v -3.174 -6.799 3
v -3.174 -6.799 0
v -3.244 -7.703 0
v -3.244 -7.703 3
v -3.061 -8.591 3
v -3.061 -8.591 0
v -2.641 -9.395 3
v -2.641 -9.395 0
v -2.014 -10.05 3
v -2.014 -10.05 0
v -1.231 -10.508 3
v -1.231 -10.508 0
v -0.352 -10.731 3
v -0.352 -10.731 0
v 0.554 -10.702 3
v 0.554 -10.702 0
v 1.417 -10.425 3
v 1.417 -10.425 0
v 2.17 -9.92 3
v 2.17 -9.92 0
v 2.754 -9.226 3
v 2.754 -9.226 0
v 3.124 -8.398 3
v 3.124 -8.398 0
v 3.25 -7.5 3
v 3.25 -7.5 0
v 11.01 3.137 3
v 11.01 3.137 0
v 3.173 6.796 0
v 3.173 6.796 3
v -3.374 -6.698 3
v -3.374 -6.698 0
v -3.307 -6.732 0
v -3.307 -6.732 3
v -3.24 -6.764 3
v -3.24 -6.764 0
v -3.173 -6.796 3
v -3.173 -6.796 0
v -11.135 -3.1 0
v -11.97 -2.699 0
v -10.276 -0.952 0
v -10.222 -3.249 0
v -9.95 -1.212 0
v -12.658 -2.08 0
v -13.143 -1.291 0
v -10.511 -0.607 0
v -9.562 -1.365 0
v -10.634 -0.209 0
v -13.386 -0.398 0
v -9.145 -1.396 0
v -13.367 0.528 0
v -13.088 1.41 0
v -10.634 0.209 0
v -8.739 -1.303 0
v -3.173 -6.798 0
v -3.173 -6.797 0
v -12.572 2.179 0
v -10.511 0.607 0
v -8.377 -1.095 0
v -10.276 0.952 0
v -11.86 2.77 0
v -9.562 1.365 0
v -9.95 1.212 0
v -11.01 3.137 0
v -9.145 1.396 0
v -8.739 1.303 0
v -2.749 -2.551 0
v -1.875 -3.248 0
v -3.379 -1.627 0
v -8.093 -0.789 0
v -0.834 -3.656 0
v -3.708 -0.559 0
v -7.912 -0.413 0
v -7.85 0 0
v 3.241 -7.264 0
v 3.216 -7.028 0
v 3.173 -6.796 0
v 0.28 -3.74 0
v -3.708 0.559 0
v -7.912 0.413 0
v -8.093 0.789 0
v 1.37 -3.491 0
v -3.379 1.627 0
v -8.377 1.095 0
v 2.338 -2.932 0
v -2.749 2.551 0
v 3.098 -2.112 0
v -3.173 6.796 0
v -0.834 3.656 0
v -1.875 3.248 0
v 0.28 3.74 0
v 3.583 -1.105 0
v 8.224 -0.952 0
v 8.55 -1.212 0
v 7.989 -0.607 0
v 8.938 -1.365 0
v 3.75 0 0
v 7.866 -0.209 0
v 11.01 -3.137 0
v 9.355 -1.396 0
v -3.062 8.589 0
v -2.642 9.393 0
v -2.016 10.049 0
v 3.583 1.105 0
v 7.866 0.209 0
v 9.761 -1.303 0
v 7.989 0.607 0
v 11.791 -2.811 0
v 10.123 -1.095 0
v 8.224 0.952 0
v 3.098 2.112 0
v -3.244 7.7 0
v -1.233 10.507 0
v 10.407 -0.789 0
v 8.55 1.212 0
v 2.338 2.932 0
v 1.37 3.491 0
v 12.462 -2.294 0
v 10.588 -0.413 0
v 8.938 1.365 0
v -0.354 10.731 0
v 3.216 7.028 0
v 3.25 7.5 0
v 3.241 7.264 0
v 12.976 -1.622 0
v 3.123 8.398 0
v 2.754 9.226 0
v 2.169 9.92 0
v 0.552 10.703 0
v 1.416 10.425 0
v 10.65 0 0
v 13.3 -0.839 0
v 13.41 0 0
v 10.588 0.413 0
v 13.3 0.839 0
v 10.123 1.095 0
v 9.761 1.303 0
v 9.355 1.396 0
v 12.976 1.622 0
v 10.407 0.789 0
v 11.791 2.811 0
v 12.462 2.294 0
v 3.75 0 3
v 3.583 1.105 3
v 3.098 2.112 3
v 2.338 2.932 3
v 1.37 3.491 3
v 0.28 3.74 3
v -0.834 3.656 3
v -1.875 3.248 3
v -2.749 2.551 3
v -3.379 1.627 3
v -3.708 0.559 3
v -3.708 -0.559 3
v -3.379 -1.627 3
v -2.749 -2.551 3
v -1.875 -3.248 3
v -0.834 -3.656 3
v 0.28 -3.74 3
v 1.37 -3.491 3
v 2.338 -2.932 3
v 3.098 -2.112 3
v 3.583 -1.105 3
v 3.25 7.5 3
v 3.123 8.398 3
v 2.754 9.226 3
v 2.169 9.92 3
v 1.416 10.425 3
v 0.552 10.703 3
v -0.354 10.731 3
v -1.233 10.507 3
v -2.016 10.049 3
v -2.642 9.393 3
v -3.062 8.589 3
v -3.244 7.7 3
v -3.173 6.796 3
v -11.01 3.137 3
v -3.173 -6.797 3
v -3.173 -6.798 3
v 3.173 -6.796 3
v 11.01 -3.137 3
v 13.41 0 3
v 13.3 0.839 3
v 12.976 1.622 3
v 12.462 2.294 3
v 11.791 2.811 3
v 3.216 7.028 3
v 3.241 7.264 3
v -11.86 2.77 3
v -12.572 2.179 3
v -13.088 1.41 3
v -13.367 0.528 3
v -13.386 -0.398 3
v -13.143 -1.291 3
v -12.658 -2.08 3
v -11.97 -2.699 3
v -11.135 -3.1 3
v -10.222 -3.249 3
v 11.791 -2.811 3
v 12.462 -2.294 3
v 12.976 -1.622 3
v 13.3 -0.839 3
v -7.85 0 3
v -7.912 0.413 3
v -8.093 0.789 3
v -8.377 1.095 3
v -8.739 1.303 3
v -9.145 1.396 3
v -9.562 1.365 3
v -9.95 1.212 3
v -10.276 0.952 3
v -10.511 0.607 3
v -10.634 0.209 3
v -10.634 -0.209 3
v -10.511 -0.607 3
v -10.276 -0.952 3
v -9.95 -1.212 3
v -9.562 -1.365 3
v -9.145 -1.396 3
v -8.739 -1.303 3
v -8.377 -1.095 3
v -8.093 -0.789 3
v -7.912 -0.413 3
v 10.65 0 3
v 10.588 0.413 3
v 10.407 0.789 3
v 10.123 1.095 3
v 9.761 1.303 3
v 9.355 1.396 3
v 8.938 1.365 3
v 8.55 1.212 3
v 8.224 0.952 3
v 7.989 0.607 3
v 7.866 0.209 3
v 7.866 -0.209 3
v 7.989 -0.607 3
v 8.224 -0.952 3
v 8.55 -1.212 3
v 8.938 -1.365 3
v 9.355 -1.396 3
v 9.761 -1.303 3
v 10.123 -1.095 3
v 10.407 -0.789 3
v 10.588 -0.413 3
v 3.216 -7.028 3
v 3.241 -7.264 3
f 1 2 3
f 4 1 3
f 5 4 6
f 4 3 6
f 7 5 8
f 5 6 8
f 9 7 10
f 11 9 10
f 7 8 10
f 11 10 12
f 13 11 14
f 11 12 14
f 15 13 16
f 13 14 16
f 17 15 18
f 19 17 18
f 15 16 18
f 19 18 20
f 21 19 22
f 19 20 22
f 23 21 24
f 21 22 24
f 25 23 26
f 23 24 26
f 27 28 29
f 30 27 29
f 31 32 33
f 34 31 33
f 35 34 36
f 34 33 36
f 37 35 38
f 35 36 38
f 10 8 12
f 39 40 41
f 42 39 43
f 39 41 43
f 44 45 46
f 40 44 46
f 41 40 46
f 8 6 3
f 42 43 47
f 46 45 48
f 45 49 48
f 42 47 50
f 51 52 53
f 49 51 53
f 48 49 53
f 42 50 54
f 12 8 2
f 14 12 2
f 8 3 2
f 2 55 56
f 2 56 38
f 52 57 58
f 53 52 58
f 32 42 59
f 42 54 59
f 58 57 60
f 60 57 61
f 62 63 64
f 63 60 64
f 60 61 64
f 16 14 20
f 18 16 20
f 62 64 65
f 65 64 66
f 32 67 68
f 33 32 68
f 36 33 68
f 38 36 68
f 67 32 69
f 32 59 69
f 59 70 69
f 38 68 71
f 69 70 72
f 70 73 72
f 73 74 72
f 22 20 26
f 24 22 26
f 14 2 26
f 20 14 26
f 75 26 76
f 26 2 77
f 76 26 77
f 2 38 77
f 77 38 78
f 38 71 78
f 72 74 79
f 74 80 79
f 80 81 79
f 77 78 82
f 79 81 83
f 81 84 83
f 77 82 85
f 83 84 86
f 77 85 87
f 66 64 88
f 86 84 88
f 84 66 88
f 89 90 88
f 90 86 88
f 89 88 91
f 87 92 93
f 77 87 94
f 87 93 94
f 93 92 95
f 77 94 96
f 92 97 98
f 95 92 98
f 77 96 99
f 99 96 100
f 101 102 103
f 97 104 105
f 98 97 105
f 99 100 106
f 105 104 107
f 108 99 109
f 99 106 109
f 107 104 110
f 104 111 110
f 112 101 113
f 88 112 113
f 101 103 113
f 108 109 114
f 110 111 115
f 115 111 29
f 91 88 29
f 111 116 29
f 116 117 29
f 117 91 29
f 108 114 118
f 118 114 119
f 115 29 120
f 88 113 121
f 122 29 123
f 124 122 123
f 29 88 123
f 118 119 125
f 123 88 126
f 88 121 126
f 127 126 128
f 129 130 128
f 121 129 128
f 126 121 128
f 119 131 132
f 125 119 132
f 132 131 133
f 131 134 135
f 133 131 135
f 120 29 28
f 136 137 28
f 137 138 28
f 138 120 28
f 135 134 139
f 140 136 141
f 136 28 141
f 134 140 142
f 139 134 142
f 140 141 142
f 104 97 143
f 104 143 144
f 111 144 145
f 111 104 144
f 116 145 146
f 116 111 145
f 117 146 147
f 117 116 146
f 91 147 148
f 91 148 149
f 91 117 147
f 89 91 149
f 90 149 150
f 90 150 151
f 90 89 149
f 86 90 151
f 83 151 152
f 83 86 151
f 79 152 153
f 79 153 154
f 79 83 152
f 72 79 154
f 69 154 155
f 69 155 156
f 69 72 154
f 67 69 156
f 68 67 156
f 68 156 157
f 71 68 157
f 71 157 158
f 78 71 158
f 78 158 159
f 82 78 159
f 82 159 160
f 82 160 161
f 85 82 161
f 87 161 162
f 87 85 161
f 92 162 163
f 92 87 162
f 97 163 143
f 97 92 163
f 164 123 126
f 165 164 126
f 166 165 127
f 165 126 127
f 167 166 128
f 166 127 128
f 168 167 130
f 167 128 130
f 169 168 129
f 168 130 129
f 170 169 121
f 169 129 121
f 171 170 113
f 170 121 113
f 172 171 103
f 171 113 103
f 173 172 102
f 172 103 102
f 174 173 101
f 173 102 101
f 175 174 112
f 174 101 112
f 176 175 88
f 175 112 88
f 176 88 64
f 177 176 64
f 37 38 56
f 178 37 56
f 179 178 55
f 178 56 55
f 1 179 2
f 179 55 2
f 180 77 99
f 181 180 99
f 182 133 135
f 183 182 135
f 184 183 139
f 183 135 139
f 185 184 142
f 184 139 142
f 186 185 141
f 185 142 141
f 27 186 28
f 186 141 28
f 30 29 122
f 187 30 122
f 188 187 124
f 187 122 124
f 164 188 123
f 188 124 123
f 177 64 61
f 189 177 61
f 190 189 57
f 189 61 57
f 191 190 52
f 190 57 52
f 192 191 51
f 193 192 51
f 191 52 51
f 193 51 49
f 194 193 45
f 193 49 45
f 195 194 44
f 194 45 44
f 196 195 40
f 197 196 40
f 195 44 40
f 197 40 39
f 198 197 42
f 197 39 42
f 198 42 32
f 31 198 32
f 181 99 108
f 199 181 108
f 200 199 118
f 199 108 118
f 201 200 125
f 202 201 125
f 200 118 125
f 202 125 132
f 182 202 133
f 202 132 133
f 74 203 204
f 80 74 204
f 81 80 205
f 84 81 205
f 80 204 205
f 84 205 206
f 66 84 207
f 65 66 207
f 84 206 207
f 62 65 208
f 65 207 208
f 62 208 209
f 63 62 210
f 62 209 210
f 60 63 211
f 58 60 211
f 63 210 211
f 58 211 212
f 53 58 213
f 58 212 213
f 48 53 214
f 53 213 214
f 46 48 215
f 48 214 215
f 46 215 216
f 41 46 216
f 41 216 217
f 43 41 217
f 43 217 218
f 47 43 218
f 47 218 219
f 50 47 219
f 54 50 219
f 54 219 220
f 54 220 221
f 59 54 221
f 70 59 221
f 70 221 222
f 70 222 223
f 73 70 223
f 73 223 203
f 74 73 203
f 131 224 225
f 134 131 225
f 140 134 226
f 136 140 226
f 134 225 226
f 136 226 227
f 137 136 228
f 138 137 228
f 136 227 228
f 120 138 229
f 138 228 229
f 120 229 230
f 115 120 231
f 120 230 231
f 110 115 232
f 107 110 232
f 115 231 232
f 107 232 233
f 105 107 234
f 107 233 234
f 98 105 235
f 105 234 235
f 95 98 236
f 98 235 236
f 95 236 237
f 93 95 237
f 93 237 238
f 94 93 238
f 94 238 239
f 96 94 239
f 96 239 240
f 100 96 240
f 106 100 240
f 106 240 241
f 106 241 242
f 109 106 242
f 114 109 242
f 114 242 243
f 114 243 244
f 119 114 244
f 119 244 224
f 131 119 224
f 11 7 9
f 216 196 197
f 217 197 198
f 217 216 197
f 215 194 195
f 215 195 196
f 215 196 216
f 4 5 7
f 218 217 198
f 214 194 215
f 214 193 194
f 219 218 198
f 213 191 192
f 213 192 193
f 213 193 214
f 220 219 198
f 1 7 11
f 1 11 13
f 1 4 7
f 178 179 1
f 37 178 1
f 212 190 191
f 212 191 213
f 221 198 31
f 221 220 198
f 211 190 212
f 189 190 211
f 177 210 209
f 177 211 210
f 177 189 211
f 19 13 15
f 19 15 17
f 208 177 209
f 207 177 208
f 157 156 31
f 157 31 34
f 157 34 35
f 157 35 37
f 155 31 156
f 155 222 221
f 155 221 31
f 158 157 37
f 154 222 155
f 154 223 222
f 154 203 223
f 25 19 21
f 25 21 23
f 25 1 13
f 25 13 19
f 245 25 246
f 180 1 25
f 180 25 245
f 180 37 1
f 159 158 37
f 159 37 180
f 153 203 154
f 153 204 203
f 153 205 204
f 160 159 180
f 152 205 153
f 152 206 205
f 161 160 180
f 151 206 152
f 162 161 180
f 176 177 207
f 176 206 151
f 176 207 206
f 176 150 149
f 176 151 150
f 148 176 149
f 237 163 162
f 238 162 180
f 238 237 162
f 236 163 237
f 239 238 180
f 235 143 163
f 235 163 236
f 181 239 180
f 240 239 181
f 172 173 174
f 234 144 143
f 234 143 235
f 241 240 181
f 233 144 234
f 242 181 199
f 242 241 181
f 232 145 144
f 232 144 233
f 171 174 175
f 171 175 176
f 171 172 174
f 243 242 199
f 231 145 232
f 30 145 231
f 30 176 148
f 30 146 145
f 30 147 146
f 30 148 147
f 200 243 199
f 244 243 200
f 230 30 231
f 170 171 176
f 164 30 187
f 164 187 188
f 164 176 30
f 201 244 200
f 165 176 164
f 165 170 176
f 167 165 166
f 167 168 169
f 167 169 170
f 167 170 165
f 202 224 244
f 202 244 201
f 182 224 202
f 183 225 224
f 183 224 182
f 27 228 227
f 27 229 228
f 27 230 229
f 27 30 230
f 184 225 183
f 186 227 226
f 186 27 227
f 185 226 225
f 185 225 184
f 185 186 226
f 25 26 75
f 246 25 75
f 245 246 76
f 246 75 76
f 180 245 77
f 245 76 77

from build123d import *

# Parameters (mm, degrees)
F0_R     = 3.75
F1_DEPTH = 3
F2_R     = 1.4
F3_DEPTH = 6.096


# Not quite as in the source:
# - a feature names something its author has since deleted; it is built from what else it names


with BuildPart() as f1:
    # F0 (on Top) → F1 (new body)
    with BuildSketch(Plane.XY):
        with BuildLine():
            ThreePointArc((-3.1727983399, 6.7958333333), (0, 4.25), (3.1727983399, 6.7958333333))
            ThreePointArc((3.1727983399, 6.7958333333), (0, 7.5), (-3.1727983399, 6.7958333333))
        make_face()
        with BuildLine():
            Line((11.0098453548, 3.1369193284), (3.1727983399, 6.7958333333))
            ThreePointArc((3.1727983399, 6.7958333333), (5.8592267319, 4.6818225195), (7.3284005906, 1.5951629335))
            ThreePointArc((7.3284005906, 1.5951629335), (8.9045755783, 2.9977340645), (11.0098453548, 3.1369193284))
        make_face()
        with BuildLine():
            ThreePointArc((7.3284005906, 1.5951629335), (5.8592267319, 4.6818225195), (3.1727983399, 6.7958333333))
            ThreePointArc((3.1727983399, 6.7958333333), (0, 4.25), (-3.1727983399, 6.7958333333))
            ThreePointArc((-3.1727983399, 6.7958333333), (-5.8592267319, 4.6818225195), (-7.3284005906, 1.5951629335))
            ThreePointArc((-7.3284005906, 1.5951629335), (-7.0163398656, 0.8245610709), (-6.91, 0))
            ThreePointArc((-6.91, 0), (-7.0163398656, -0.8245610709), (-7.3284005906, -1.5951629335))
            ThreePointArc((-7.3284005906, -1.5951629335), (-5.9282154859, -4.5941551076), (-3.3735330862, -6.6984531435))
            ThreePointArc((-3.3735330862, -6.6984531435), (-3.2735278386, -6.7478897064), (-3.1727983399, -6.7958333333))
            ThreePointArc((-3.1727983399, -6.7958333333), (0, -4.25), (3.1727983399, -6.7958333333))
            ThreePointArc((3.1727983399, -6.7958333333), (5.8592267319, -4.6818225195), (7.3284005906, -1.5951629335))
            ThreePointArc((7.3284005906, -1.5951629335), (6.91, 0), (7.3284005906, 1.5951629335))
        make_face()
        Circle(F0_R, mode=Mode.SUBTRACT)
        with BuildLine():
            ThreePointArc((-3.1727983399, 6.7958333333), (0, 7.5), (3.1727983399, 6.7958333333))
            ThreePointArc((3.1727983399, 6.7958333333), (3.2306419335, 7.1458069768), (3.25, 7.5))
            ThreePointArc((3.25, 7.5), (-0.3541930232, 10.7306419335), (-3.1727983399, 6.7958333333))
        make_face()
        with BuildLine():
            ThreePointArc((-7.3284005906, 1.5951629335), (-5.8592267319, 4.6818225195), (-3.1727983399, 6.7958333333))
            Line((-3.1727983399, 6.7958333333), (-11.0098453548, 3.1369193284))
            ThreePointArc((-11.0098453548, 3.1369193284), (-8.9045755783, 2.9977340645), (-7.3284005906, 1.5951629335))
        make_face()
        with BuildLine():
            ThreePointArc((11.0098453548, 3.1369193284), (8.9045755783, 2.9977340645), (7.3284005906, 1.5951629335))
            ThreePointArc((7.3284005906, 1.5951629335), (7.4569767476, 0.8021831371), (7.5, 0))
            ThreePointArc((7.5, 0), (7.4569767476, -0.8021831371), (7.3284005906, -1.5951629335))
            ThreePointArc((7.3284005906, -1.5951629335), (8.9045755783, -2.9977340645), (11.0098453548, -3.1369193284))
            ThreePointArc((11.0098453548, -3.1369193284), (12.7411332204, -1.9749053898), (13.41, 0))
            ThreePointArc((13.41, 0), (12.7411332204, 1.9749053898), (11.0098453548, 3.1369193284))
        make_face()
        with BuildLine():
            ThreePointArc((7.5, 0), (7.4569767476, 0.8021831371), (7.3284005906, 1.5951629335))
            ThreePointArc((7.3284005906, 1.5951629335), (6.91, 0), (7.3284005906, -1.5951629335))
            ThreePointArc((7.3284005906, -1.5951629335), (7.4569767476, -0.8021831371), (7.5, 0))
        make_face()
        with BuildLine():
            ThreePointArc((-6.91, 0), (-7.0163398656, 0.8245610709), (-7.3284005906, 1.5951629335))
            ThreePointArc((-7.3284005906, 1.5951629335), (-7.5, 0), (-7.3284005906, -1.5951629335))
            ThreePointArc((-7.3284005906, -1.5951629335), (-7.0163398656, -0.8245610709), (-6.91, 0))
        make_face()
        with BuildLine():
            ThreePointArc((-7.3284005906, -1.5951629335), (-7.5, 0), (-7.3284005906, 1.5951629335))
            ThreePointArc((-7.3284005906, 1.5951629335), (-8.9045755783, 2.9977340645), (-11.0098453548, 3.1369193284))
            ThreePointArc((-11.0098453548, 3.1369193284), (-13.3855431521, -0.3979590107), (-10.2219168602, -3.2494101468))
            ThreePointArc((-10.2219168602, -3.2494101468), (-8.5469535603, -2.8214501915), (-7.3284005906, -1.5951629335))
        make_face()
        with BuildLine():
            ThreePointArc((11.0098453548, -3.1369193284), (8.9045755783, -2.9977340645), (7.3284005906, -1.5951629335))
            ThreePointArc((7.3284005906, -1.5951629335), (5.8592267319, -4.6818225195), (3.1727983399, -6.7958333333))
            Line((3.1727983399, -6.7958333333), (11.0098453548, -3.1369193284))
        make_face()
        with BuildLine():
            ThreePointArc((-3.3735330862, -6.6984531435), (-5.9282154859, -4.5941551076), (-7.3284005906, -1.5951629335))
            ThreePointArc((-7.3284005906, -1.5951629335), (-8.5469535603, -2.8214501915), (-10.2219168602, -3.2494101468))
            Line((-10.2219168602, -3.2494101468), (-3.3735330862, -6.6984531435))
        make_face()
        with BuildLine():
            ThreePointArc((3.25, -7.5), (3.2306419335, -7.1458069768), (3.1727983399, -6.7958333333))
            ThreePointArc((3.1727983399, -6.7958333333), (0, -7.5), (-3.1727983399, -6.7958333333))
            ThreePointArc((-3.1727983399, -6.7958333333), (-3.1731688138, -6.7975046766), (-3.1735384072, -6.7991762148))
            ThreePointArc((-3.1735384072, -6.7991762148), (-0.3524912598, -10.7308280536), (3.25, -7.5))
        make_face()
        with BuildLine():
            ThreePointArc((-3.1727983399, -6.7958333333), (0, -7.5), (3.1727983399, -6.7958333333))
            ThreePointArc((3.1727983399, -6.7958333333), (0, -4.25), (-3.1727983399, -6.7958333333))
        make_face()
    extrude(amount=F1_DEPTH)

    # F2 (on face) → F3 (cut)
    with BuildSketch(Plane.XY.offset(3)):
        with Locations((-9.25, 0)):
            Circle(F2_R)
        with Locations((9.25, 0)):
            Circle(F2_R)
    extrude(amount=-F3_DEPTH, mode=Mode.SUBTRACT)


solid = f1.part
